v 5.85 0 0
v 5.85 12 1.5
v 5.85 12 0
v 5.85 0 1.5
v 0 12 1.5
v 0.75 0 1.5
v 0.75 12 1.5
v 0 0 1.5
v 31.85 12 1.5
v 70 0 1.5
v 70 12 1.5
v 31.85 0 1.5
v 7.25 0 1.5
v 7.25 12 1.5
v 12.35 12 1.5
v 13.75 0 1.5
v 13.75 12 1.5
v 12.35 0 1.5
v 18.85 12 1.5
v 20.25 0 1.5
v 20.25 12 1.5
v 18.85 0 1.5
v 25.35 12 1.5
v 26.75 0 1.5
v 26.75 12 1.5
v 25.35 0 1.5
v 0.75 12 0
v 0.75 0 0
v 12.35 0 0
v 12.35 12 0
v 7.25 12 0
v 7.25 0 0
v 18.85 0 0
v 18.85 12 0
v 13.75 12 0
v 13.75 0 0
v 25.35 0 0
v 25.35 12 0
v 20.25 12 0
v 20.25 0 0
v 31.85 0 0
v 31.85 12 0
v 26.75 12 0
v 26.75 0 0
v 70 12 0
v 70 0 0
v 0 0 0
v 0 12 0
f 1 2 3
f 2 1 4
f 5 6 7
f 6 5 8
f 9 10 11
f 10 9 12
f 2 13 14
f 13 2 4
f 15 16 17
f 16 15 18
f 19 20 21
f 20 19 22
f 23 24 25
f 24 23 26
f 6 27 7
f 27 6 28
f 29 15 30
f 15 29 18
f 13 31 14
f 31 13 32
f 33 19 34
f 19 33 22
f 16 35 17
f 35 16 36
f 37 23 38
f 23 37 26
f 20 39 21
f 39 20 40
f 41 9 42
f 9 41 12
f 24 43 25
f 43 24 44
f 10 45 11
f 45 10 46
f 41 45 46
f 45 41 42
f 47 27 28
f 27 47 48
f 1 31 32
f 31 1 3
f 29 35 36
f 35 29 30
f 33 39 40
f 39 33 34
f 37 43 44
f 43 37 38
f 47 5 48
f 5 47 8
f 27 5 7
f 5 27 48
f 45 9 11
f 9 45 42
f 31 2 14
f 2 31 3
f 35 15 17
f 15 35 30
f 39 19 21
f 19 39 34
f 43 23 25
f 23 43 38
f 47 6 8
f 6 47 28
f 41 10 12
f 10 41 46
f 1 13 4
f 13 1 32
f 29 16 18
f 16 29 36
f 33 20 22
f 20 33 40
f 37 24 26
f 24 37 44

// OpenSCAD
// OpenSCAD code for a 10-well agarose gel comb

// --- Dimensions ---
spine_length = 70;      // Total length of the spine (X dimension)
spine_width = 12;       // Width of the spine (Y dimension)
comb_thickness = 1.5;   // Thickness of the entire plate (Z dimension)

tooth_width = 5.0;      // Width of each tooth (X dimension)
tooth_length = 12.0;    // Length/depth of each tooth (Y dimension, extending into gel)
gap_size = 1.5;         // Gap size between teeth

num_teeth = 10;         // Number of wells/teeth

// --- Constants ---
$fn = 64; // High resolution for curves

// --- Geometry Calculations ---

// Total width occupied by teeth and gaps along the X-axis (for centering)
total_tooth_span = num_teeth * tooth_width + (num_teeth - 1) * gap_size;

// Calculate the starting X position to center the row of teeth on the spine's length (70mm).
// The spine spans from -35 to 35. We want the total span (total_tooth_span) centered around X=0.
start_x_teeth = -(total_tooth_span / 2);


// --- Main Assembly ---

module gel_comb() {
    difference() {
        // 1. Base Plate (The solid body) - Centered at origin in XY plane
        cube([spine_length, spine_width, comb_thickness]);

        // 2. Cutting the teeth slots (using difference to create holes/slots)
        for (i = [0 : num_teeth - 1]) {
            // Calculate the X position for the current tooth center
            current_tooth_x = start_x_teeth + i * (tooth_width + gap_size);

            // The teeth are cut from one long edge of the spine.
            // Spine spans Y from -6 to 6. We cut from the positive Y edge (Y = spine_width / 2 = 6).
            // The cutter must be slightly larger than the tooth dimensions to ensure clean separation.
            cutter_x = tooth_width + 0.1; // Slightly wider cut
            cutter_y = tooth_length + 0.1; // Slightly deeper cut (must extend past the base plate)
            cutter_z = comb_thickness + 0.01; // Ensure it cuts all the way through

            // Translate to position the cutter:
            // X: current_tooth_x
            // Y: spine_width/2 - cutter_y/2 (to center the cut along the edge)
            // Z: -0.01 (to ensure the cut starts slightly below Z=0)
            translate([current_tooth_x, spine_width/2 - cutter_y/2, -0.01]) {
                // The tooth slot is a rectangular prism cut into the base plate
                cube([cutter_x, cutter_y, comb_thickness + 0.01]);
            }
        }
    }
}

gel_comb();
